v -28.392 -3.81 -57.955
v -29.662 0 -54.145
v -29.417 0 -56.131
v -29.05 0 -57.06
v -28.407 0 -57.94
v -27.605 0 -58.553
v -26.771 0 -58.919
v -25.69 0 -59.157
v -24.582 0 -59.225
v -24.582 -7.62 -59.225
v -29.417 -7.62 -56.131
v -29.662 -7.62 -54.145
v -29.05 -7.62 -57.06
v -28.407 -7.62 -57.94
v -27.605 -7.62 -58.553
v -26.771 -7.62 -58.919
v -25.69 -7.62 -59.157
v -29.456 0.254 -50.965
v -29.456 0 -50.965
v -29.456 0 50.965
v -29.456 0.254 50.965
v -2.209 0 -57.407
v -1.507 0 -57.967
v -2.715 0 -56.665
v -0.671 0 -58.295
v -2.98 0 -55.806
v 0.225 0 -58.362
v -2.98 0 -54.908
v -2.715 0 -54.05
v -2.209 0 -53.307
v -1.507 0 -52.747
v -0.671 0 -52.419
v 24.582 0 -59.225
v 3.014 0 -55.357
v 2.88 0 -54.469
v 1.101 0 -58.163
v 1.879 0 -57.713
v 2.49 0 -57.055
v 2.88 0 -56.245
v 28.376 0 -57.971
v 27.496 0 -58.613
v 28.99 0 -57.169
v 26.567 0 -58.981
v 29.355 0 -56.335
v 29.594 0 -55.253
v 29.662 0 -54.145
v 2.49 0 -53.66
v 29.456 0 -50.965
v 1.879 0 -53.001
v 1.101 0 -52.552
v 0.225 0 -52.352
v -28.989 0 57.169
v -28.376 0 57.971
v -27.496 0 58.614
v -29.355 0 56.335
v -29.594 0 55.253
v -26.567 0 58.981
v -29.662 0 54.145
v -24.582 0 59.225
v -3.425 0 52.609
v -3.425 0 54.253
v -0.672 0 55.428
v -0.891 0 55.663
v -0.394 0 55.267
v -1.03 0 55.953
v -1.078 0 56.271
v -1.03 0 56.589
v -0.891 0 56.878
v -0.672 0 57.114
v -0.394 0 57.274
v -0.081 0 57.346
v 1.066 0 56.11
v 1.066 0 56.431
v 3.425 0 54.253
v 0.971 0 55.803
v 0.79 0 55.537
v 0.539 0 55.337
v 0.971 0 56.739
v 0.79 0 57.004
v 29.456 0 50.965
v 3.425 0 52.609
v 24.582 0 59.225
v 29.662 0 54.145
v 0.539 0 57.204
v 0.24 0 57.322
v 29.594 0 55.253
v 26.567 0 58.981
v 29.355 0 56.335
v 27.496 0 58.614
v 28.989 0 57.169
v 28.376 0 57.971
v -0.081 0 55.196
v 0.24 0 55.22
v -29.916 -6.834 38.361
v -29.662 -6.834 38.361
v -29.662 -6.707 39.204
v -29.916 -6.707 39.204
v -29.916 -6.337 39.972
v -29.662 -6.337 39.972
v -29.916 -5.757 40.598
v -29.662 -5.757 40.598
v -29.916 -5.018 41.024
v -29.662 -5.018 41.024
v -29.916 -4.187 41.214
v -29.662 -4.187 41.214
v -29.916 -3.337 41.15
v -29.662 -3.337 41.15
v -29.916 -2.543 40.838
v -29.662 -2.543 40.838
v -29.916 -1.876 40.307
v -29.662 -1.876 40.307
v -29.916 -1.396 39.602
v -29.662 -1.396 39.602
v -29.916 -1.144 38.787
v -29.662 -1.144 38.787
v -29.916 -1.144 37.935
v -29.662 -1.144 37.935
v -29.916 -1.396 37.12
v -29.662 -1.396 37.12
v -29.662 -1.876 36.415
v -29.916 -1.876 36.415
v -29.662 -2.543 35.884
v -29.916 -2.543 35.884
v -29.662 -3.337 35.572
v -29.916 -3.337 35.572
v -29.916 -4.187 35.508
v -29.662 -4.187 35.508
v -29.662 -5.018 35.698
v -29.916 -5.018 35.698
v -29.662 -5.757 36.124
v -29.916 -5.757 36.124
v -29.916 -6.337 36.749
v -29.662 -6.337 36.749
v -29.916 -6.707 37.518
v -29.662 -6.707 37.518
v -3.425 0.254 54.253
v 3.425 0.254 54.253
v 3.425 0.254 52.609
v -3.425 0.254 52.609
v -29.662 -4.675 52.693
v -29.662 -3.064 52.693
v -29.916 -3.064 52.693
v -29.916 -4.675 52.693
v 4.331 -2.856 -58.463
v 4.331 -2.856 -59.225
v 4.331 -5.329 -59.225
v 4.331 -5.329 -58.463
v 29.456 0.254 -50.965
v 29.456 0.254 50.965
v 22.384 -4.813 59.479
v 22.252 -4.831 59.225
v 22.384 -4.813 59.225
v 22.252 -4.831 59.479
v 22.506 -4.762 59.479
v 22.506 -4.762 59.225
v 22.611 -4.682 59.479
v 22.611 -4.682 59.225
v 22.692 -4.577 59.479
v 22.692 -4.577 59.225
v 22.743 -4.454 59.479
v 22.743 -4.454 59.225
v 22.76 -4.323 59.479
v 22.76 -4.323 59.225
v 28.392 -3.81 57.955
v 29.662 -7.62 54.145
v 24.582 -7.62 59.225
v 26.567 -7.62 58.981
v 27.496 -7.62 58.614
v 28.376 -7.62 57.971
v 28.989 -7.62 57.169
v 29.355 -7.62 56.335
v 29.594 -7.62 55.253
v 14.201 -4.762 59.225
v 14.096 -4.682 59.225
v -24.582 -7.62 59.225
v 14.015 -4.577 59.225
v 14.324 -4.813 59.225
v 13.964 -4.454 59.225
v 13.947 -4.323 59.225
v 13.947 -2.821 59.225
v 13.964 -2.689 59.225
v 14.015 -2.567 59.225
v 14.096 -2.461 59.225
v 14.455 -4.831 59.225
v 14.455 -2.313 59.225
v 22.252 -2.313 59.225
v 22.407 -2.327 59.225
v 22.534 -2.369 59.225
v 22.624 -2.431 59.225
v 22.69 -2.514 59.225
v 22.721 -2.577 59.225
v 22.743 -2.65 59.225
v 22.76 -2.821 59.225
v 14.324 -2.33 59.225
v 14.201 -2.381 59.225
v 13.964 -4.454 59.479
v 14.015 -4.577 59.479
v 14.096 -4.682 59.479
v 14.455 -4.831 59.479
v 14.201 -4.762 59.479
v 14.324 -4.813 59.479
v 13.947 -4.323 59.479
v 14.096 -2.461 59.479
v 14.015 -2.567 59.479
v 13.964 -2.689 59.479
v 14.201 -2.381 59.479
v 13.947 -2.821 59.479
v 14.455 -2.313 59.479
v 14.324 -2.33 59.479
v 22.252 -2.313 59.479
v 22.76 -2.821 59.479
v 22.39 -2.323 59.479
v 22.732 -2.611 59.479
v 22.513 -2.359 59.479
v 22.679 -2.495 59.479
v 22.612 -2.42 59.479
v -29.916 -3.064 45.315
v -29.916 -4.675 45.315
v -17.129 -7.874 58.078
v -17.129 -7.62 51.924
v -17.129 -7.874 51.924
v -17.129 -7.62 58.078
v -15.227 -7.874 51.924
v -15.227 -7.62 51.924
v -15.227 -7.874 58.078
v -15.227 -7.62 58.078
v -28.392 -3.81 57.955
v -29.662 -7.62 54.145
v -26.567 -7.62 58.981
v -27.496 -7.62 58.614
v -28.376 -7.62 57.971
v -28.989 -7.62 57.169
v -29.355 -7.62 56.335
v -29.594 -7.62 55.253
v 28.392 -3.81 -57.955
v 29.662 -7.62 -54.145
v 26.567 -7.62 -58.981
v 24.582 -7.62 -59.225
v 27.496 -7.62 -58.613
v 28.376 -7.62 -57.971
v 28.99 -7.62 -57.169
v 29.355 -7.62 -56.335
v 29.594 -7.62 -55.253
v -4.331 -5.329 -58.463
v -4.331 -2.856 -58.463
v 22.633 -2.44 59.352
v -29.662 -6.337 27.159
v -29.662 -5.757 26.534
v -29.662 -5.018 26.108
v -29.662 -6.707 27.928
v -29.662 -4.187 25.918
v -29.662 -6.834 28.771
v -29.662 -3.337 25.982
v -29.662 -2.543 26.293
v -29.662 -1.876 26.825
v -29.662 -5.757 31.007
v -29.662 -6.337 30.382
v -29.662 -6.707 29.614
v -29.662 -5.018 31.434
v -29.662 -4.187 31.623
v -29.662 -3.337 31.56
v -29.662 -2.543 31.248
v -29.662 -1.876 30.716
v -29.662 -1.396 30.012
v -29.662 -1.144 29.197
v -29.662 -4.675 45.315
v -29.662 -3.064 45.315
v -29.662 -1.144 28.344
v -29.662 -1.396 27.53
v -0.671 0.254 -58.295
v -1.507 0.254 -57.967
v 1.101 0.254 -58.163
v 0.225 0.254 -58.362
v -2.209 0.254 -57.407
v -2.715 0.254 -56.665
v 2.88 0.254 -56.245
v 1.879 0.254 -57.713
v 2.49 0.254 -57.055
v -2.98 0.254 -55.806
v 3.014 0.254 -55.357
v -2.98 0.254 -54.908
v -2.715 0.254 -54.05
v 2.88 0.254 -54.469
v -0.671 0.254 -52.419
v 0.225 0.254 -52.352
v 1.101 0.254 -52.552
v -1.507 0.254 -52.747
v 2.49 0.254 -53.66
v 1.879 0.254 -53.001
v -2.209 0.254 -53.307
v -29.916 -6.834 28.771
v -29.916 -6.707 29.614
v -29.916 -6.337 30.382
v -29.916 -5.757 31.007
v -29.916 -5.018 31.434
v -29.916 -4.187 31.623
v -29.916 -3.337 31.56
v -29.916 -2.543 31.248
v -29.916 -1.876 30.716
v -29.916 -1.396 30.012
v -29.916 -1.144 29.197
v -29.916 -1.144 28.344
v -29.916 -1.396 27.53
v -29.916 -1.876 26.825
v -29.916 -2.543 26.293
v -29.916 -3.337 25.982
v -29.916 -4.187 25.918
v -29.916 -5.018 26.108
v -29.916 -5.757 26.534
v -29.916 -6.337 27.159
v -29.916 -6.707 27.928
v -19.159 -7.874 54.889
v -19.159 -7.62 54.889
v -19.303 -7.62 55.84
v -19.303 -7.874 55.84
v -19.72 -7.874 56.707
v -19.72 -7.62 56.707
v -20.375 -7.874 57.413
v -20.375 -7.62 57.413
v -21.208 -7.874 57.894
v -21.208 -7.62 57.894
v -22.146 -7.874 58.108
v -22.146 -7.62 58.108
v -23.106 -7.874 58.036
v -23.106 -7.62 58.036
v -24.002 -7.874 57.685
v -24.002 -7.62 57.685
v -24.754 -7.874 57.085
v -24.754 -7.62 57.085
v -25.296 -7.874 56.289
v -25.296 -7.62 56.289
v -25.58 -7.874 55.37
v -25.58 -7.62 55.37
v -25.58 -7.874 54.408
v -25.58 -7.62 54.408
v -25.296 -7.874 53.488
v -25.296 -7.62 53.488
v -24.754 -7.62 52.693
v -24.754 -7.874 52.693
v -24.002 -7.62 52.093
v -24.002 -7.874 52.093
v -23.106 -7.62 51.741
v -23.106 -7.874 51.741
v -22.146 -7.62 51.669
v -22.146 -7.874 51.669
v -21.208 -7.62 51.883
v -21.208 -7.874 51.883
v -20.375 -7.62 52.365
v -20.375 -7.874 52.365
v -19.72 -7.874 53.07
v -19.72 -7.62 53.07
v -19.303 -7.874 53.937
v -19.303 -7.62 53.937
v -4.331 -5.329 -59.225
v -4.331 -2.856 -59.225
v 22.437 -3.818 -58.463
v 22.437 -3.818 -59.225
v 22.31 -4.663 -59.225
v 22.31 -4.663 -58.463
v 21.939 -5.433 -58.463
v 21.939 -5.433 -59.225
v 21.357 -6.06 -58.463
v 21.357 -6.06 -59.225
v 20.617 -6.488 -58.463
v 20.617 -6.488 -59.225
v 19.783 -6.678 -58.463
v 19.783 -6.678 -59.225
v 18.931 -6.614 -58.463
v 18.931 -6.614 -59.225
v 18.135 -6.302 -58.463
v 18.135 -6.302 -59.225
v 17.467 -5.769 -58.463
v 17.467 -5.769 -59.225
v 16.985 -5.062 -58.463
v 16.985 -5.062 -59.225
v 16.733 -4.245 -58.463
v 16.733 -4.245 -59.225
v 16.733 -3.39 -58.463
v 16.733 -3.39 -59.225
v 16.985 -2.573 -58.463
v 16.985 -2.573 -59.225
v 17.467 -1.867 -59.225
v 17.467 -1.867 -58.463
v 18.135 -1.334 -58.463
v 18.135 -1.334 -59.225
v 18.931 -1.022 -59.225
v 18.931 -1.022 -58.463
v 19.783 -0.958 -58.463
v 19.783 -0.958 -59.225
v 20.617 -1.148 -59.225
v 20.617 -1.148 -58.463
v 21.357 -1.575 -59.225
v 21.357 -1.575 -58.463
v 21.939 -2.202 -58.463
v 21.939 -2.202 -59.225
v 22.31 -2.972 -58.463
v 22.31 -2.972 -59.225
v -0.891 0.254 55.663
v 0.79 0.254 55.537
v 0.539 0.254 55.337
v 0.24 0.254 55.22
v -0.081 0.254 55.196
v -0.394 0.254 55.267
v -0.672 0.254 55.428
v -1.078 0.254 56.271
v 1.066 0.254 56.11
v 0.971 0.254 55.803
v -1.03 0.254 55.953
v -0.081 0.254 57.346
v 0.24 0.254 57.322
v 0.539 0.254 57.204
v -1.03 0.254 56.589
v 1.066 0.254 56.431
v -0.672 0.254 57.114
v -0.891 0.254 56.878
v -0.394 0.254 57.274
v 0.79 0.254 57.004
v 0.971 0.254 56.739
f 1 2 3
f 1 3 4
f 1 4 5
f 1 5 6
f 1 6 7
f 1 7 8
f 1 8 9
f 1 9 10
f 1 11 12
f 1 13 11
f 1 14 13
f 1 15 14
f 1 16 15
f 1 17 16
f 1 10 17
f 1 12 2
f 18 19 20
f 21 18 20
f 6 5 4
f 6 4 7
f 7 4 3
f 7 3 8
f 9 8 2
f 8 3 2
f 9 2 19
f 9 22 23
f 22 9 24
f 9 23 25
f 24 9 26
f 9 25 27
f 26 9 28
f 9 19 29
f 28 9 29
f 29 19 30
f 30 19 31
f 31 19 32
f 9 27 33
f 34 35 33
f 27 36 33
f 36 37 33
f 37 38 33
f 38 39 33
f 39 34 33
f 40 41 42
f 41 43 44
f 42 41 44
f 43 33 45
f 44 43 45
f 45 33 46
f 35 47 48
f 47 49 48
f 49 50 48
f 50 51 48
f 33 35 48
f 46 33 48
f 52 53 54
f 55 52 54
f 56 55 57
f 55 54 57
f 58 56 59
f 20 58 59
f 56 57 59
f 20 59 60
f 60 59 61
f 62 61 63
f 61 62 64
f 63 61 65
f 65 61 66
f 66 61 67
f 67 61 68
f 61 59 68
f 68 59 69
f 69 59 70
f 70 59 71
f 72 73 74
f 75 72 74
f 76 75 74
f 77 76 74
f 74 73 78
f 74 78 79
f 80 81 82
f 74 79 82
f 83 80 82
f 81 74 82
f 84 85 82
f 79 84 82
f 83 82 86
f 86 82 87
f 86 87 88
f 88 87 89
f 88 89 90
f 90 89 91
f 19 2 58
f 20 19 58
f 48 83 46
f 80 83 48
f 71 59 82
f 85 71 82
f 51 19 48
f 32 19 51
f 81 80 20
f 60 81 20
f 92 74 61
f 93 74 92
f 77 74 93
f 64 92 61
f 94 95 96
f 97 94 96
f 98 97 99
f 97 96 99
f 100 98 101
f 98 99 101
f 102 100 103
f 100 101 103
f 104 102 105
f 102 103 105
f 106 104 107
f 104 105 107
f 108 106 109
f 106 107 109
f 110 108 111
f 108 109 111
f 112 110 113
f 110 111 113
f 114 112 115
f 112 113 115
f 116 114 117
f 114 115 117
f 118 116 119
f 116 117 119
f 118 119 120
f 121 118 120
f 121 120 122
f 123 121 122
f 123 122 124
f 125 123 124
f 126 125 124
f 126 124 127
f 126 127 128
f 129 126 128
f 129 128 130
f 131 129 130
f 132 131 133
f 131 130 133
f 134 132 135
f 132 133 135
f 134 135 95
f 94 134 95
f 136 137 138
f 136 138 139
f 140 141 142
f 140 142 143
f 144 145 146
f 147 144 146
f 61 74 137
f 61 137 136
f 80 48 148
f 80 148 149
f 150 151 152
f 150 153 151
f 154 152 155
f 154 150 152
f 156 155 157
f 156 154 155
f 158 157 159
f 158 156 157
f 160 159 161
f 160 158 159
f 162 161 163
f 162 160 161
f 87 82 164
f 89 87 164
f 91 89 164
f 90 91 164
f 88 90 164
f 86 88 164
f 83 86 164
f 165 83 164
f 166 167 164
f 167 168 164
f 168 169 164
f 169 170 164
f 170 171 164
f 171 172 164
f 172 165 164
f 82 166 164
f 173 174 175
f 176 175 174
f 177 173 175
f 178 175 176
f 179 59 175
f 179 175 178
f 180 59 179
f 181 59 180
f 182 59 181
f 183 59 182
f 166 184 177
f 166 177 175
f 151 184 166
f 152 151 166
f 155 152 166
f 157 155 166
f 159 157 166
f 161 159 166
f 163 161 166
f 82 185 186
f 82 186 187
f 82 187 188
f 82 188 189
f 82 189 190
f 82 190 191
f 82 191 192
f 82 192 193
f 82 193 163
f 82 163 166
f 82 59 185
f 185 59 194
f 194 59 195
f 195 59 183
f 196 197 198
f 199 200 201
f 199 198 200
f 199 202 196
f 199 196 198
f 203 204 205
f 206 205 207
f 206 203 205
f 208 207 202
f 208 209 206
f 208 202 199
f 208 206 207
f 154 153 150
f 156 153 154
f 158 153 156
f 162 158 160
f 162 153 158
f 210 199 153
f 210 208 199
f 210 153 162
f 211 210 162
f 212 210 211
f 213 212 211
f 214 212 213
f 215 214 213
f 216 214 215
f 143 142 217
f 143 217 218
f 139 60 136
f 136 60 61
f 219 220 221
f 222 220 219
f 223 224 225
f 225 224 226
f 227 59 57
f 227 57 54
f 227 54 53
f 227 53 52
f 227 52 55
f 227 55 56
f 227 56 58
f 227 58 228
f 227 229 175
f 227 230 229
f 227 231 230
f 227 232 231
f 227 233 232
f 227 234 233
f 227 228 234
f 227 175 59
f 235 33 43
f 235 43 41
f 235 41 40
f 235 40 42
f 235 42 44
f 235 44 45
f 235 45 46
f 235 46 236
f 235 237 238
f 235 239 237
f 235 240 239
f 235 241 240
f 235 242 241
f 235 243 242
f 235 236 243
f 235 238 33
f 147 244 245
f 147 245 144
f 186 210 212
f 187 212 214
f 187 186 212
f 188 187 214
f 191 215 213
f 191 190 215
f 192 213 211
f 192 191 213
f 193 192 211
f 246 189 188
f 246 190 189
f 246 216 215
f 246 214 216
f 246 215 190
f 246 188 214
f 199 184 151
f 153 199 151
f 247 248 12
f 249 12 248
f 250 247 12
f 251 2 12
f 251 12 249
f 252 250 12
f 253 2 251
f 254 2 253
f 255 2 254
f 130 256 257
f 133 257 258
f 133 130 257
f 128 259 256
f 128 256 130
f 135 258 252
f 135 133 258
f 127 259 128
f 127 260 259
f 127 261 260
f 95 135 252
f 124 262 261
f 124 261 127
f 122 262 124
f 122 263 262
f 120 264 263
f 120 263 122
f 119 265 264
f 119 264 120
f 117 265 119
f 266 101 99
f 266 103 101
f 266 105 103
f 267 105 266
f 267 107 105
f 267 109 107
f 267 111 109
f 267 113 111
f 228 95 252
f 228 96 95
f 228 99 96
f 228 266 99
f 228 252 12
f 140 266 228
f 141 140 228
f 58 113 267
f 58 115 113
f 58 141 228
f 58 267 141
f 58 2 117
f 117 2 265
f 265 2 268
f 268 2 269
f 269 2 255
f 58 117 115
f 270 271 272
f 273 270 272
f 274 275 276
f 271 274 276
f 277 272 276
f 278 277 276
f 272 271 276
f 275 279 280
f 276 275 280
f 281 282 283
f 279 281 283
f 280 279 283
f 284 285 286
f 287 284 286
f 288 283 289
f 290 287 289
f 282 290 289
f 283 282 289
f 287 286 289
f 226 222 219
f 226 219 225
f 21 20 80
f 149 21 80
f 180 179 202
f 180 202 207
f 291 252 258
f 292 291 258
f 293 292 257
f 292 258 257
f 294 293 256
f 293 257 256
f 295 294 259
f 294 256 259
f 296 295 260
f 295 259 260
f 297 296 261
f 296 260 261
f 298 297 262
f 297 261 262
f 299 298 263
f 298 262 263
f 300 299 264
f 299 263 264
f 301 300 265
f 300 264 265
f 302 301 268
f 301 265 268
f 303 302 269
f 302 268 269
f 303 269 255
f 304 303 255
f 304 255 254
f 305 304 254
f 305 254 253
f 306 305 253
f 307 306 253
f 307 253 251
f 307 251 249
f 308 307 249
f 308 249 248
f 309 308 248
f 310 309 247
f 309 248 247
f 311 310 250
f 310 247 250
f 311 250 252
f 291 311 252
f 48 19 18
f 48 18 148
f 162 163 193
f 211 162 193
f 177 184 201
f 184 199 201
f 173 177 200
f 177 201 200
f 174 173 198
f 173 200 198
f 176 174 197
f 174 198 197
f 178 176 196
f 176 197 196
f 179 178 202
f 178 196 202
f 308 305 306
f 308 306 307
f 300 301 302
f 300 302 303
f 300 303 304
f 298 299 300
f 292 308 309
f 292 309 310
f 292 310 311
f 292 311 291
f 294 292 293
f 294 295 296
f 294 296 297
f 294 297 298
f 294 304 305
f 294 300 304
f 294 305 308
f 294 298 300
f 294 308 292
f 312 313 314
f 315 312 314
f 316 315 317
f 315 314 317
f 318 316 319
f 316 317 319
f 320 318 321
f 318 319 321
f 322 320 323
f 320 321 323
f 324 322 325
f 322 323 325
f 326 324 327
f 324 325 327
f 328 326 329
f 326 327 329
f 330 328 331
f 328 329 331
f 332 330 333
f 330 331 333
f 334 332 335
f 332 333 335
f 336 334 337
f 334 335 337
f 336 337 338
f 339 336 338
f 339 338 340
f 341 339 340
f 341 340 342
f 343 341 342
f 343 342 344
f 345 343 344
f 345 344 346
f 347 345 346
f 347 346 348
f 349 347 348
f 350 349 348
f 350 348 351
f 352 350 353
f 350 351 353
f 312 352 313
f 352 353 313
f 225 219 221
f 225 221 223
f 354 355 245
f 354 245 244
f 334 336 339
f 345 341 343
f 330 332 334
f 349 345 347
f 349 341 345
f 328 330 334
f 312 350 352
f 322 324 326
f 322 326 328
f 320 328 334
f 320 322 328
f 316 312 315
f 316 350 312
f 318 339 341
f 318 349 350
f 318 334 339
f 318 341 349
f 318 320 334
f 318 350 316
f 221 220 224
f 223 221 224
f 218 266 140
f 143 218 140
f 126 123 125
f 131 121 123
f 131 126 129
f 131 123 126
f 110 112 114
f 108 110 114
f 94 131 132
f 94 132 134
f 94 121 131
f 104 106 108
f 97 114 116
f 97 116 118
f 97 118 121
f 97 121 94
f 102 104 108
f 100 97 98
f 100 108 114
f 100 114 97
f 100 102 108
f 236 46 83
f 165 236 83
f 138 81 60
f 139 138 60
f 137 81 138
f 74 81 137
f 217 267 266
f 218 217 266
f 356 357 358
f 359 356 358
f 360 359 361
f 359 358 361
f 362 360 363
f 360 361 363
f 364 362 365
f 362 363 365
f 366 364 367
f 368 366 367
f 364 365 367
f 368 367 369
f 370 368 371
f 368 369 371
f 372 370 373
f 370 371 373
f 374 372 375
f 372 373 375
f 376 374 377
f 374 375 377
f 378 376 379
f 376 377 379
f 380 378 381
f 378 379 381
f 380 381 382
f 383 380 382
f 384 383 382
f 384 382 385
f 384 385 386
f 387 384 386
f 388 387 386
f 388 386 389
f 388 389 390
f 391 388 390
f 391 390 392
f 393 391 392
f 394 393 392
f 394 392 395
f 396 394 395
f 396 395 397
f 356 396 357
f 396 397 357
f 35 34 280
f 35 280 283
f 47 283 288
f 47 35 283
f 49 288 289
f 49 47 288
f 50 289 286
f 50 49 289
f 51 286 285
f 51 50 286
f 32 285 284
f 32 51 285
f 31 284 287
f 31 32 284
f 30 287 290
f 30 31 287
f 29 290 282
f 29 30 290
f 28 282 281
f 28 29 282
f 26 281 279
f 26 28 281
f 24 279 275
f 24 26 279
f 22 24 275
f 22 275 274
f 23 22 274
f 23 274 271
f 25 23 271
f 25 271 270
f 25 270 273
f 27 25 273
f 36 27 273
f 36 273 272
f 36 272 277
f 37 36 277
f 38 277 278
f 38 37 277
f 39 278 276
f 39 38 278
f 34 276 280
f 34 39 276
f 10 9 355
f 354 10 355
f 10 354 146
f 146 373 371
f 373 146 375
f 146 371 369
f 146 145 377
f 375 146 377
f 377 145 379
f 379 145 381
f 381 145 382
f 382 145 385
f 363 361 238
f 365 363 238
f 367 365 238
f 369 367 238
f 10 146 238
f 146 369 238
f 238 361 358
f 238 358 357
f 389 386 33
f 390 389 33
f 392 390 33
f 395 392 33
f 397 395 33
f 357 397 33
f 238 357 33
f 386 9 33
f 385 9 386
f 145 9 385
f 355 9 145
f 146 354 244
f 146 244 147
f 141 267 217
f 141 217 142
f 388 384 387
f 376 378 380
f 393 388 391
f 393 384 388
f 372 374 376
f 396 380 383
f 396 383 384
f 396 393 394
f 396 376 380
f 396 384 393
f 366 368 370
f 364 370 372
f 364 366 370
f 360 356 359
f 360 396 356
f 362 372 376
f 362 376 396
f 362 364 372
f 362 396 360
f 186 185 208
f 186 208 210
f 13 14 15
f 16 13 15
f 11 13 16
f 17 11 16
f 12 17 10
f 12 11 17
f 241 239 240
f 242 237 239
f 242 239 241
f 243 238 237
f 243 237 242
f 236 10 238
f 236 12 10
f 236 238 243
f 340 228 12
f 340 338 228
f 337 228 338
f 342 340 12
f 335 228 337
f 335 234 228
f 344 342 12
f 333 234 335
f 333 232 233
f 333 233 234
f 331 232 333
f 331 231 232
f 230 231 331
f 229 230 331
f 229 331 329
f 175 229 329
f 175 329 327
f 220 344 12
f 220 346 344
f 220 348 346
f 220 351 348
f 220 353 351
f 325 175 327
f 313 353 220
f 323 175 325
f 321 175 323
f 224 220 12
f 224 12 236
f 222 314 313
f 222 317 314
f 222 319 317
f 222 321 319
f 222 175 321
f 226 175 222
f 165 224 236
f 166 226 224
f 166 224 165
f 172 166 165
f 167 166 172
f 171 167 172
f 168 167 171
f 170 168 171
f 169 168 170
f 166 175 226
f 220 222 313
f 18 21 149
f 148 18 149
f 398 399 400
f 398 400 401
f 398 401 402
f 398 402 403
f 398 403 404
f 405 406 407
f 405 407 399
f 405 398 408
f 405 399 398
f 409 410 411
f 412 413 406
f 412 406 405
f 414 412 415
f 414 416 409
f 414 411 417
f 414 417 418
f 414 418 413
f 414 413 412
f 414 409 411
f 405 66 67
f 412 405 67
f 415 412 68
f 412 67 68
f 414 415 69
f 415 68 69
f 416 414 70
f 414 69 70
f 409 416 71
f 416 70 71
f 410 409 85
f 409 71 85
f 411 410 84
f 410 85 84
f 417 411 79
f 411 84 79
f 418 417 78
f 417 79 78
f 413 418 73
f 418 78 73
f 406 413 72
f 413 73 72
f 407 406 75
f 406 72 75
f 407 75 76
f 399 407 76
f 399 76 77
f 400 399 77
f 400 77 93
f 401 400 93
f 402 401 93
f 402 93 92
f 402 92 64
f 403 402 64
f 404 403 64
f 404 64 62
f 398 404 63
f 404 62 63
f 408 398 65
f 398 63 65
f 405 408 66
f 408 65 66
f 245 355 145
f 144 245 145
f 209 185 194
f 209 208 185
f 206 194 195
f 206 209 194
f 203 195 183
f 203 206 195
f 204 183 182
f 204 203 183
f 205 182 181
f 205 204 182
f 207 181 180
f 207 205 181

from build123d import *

# Parameters (mm, degrees)
F0_W         = 59.3232400715
F0_H         = 118.4509694576
F1_DEPTH     = 7.62
F2_T1_DEPTH  = 33.02
F3_T1_DEPTH  = 33.02
F4_T1_DEPTH  = 33.02
F5_T1_DEPTH  = 33.02
F17_W        = 8.8130328804
F17_H        = 2.5180093944
F18_DEPTH    = 0.254
F19_T1_DEPTH = 1.524
F20_R        = 0.508
F10_R        = 2.8607169915
F21_DEPTH    = 0.254
F11_R        = 2.8607134233
F22_DEPTH    = 0.254
F12_W        = 1.611137297
F12_H        = 7.3773153126
F23_DEPTH    = 0.254
F7_R         = 1.0781434008
F24_DEPTH    = 0.254
F9_W         = 6.8501718342
F9_H         = 1.6440376639
F25_DEPTH    = 0.254
F13_R        = 3.228368755
F26_DEPTH    = 0.254
F14_W        = 1.9021295011
F14_H        = 6.1539448798
F27_DEPTH    = 0.254
F8_R         = 3.0136808832
F28_DEPTH    = 0.254
F6_W         = 58.911472559
F6_H         = 101.9305512309
F29_DEPTH    = 0.254
F16_W        = 8.6615839973
F16_H        = 2.4723988026
F30_DEPTH    = 0.762
F15_R        = 2.8680658163
F31_DEPTH    = 0.762


# Not quite as in the source:
# - a fillet or chamfer that OpenCascade refuses, or shapes differently, is made with other operations: its cross-section is extruded or revolved along the edge and cut away or added


with BuildPart() as f1:
    # F0 (on Front) → F1 (new body)
    with BuildSketch(Plane.XZ):
        Rectangle(F0_W, F0_H)
    extrude(amount=F1_DEPTH)

    # F2: fillet of radius 5.08 on 1 edges, made by hand

    # F2_s2 → F2_t1 (cut)
    with BuildSketch(Plane.XZ.offset(-12.7)):
        with BuildLine():
            add(Edge.make_bspline(
                [(29.6616200358, 54.1454847288), (29.6616200358, 59.2254847288), (24.5816200358, 59.2254847288)],
                knots=[0, 0, 0, 1, 1, 1], degree=2, weights=[1, 1, 1]))
            Line((24.5816200358, 59.2254847288), (29.6616200358, 59.2254847288))
            Line((29.6616200358, 59.2254847288), (29.6616200358, 54.1454847288))
        make_face()
    extrude(amount=F2_T1_DEPTH, mode=Mode.SUBTRACT)

    # F3: fillet of radius 5.08 on 1 edges, made by hand

    # F3_s2 → F3_t1 (cut)
    with BuildSketch(Plane.XZ.offset(-12.7)):
        with BuildLine():
            add(Edge.make_bspline(
                [(-29.6616200358, 54.1454847288), (-29.6616200358, 59.2254847288), (-24.5816200358, 59.2254847288)],
                knots=[0, 0, 0, 1, 1, 1], degree=2, weights=[1, 1, 1]))
            Line((-24.5816200358, 59.2254847288), (-29.6616200358, 59.2254847288))
            Line((-29.6616200358, 59.2254847288), (-29.6616200358, 54.1454847288))
        make_face()
    extrude(amount=F3_T1_DEPTH, mode=Mode.SUBTRACT)

    # F4: fillet of radius 5.08 on 1 edges, made by hand

    # F4_s2 → F4_t1 (cut)
    with BuildSketch(Plane.XZ.offset(-12.7)):
        with BuildLine():
            add(Edge.make_bspline(
                [(-24.5816200358, -59.2254847288), (-29.6616200358, -59.2254847288), (-29.6616200358, -54.1454847288)],
                knots=[0, 0, 0, 1, 1, 1], degree=2, weights=[1, 1, 1]))
            Line((-29.6616200358, -54.1454847288), (-29.6616200358, -59.2254847288))
            Line((-29.6616200358, -59.2254847288), (-24.5816200358, -59.2254847288))
        make_face()
    extrude(amount=F4_T1_DEPTH, mode=Mode.SUBTRACT)

    # F5: fillet of radius 5.08 on 1 edges, made by hand

    # F5_s2 → F5_t1 (cut)
    with BuildSketch(Plane.XZ.offset(-12.7)):
        with BuildLine():
            add(Edge.make_bspline(
                [(29.6616200358, -54.1454847288), (29.6616200358, -59.2254847288), (24.5816200358, -59.2254847288)],
                knots=[0, 0, 0, 1, 1, 1], degree=2, weights=[1, 1, 1]))
            Line((24.5816200358, -59.2254847288), (29.6616200358, -59.2254847288))
            Line((29.6616200358, -59.2254847288), (29.6616200358, -54.1454847288))
        make_face()
    extrude(amount=F5_T1_DEPTH, mode=Mode.SUBTRACT)

    # F17 (on face) → F18 (join)
    with BuildSketch(Plane.XY.offset(59.2254847288)):
        with Locations((18.3535870165, -3.5715140402)):
            Rectangle(F17_W, F17_H)
    extrude(amount=F18_DEPTH)

    # F19: fillet of radius 0.508 on 1 edges, made by hand

    # F19_s2 → F19_t1 (cut)
    with BuildSketch(Plane.XY.offset(59.2254847288)):
        with BuildLine():
            add(Edge.make_bspline(
                [(22.2521034567, -2.312509343), (22.7601034567, -2.312509343), (22.7601034567, -2.820509343)],
                knots=[0, 0, 0, 1, 1, 1], degree=2, weights=[1, 1, 1]))
            Line((22.7601034567, -2.820509343), (22.7601034567, -2.312509343))
            Line((22.7601034567, -2.312509343), (22.2521034567, -2.312509343))
        make_face()
    extrude(amount=F19_T1_DEPTH, mode=Mode.SUBTRACT)

    # F20
    f20_edges = [f1.edges().sort_by_distance(p)[0] for p in [
        (13.947071, -2.312509, 59.352485),
        (22.760103, -4.830519, 59.352485),
        (13.947071, -4.830519, 59.352485),
    ]]
    fillet(f20_edges, radius=F20_R)

    # F10 (on face) → F21 (join)
    with BuildSketch(Plane(origin=(-29.6616200358, 0, 0), x_dir=(0, -1, 0), z_dir=(-1, 0, 0))):
        with Locations((3.9731003344, 38.3609607816)):
            Circle(F10_R)
    extrude(amount=F21_DEPTH)

    # F11 (on face) → F22 (join)
    with BuildSketch(Plane(origin=(-29.6616200358, 0, 0), x_dir=(0, -1, 0), z_dir=(-1, 0, 0))):
        with Locations((3.9731003344, 28.7707187235)):
            Circle(F11_R)
    extrude(amount=F22_DEPTH)

    # F12 (on face) → F23 (join)
    with BuildSketch(Plane(origin=(-29.6616200358, 0, 0), x_dir=(0, -1, 0), z_dir=(-1, 0, 0))):
        with Locations((3.8694504183, 49.0038786083)):
            Rectangle(F12_W, F12_H)
    extrude(amount=F23_DEPTH)

    # F7 (on face) → F24 (join)
    with BuildSketch(Plane(origin=(0, 0, 0), x_dir=(-1, 0, 0), z_dir=(0, 1, 0))):
        with Locations((0, 56.2707670033)):
            Circle(F7_R)
    extrude(amount=F24_DEPTH)

    # F9 (on face) → F25 (join)
    with BuildSketch(Plane(origin=(0, 0, 0), x_dir=(-1, 0, 0), z_dir=(0, 1, 0))):
        with Locations((0, 53.4313358366)):
            Rectangle(F9_W, F9_H)
    extrude(amount=F25_DEPTH)

    # F13 (on face) → F26 (join)
    with BuildSketch(Plane.XZ.offset(7.62)):
        with Locations((-22.3876349628, 54.8886656761)):
            Circle(F13_R)
    extrude(amount=F26_DEPTH)

    # F14 (on face) → F27 (join)
    with BuildSketch(Plane.XZ.offset(7.62)):
        with Locations((-16.1777436733, 55.0005566329)):
            Rectangle(F14_W, F14_H)
    extrude(amount=F27_DEPTH)

    # F8 (on Front) → F28 (join)
    with BuildSketch(Plane.XZ):
        with Locations((0, -55.3571693599)):
            Circle(F8_R)
    extrude(amount=-F28_DEPTH)

    # F6 (on Front) → F29 (join)
    with BuildSketch(Plane.XZ):
        Rectangle(F6_W, F6_H)
    extrude(amount=-F29_DEPTH)

    # F16 (on face) → F30 (cut)
    with BuildSketch(Plane(origin=(0, 0, -59.2254847288), x_dir=(1, 0, 0), z_dir=(0, 0, -1))):
        with Locations((0, 4.0924949571)):
            Rectangle(F16_W, F16_H)
    extrude(amount=-F30_DEPTH, mode=Mode.SUBTRACT)

    # F15 (on face) → F31 (cut)
    with BuildSketch(Plane(origin=(0, 0, -59.2254847288), x_dir=(1, 0, 0), z_dir=(0, 0, -1))):
        with Locations((19.5690467954, 3.8177834358)):
            Circle(F15_R)
    extrude(amount=-F31_DEPTH, mode=Mode.SUBTRACT)


solid = f1.part
